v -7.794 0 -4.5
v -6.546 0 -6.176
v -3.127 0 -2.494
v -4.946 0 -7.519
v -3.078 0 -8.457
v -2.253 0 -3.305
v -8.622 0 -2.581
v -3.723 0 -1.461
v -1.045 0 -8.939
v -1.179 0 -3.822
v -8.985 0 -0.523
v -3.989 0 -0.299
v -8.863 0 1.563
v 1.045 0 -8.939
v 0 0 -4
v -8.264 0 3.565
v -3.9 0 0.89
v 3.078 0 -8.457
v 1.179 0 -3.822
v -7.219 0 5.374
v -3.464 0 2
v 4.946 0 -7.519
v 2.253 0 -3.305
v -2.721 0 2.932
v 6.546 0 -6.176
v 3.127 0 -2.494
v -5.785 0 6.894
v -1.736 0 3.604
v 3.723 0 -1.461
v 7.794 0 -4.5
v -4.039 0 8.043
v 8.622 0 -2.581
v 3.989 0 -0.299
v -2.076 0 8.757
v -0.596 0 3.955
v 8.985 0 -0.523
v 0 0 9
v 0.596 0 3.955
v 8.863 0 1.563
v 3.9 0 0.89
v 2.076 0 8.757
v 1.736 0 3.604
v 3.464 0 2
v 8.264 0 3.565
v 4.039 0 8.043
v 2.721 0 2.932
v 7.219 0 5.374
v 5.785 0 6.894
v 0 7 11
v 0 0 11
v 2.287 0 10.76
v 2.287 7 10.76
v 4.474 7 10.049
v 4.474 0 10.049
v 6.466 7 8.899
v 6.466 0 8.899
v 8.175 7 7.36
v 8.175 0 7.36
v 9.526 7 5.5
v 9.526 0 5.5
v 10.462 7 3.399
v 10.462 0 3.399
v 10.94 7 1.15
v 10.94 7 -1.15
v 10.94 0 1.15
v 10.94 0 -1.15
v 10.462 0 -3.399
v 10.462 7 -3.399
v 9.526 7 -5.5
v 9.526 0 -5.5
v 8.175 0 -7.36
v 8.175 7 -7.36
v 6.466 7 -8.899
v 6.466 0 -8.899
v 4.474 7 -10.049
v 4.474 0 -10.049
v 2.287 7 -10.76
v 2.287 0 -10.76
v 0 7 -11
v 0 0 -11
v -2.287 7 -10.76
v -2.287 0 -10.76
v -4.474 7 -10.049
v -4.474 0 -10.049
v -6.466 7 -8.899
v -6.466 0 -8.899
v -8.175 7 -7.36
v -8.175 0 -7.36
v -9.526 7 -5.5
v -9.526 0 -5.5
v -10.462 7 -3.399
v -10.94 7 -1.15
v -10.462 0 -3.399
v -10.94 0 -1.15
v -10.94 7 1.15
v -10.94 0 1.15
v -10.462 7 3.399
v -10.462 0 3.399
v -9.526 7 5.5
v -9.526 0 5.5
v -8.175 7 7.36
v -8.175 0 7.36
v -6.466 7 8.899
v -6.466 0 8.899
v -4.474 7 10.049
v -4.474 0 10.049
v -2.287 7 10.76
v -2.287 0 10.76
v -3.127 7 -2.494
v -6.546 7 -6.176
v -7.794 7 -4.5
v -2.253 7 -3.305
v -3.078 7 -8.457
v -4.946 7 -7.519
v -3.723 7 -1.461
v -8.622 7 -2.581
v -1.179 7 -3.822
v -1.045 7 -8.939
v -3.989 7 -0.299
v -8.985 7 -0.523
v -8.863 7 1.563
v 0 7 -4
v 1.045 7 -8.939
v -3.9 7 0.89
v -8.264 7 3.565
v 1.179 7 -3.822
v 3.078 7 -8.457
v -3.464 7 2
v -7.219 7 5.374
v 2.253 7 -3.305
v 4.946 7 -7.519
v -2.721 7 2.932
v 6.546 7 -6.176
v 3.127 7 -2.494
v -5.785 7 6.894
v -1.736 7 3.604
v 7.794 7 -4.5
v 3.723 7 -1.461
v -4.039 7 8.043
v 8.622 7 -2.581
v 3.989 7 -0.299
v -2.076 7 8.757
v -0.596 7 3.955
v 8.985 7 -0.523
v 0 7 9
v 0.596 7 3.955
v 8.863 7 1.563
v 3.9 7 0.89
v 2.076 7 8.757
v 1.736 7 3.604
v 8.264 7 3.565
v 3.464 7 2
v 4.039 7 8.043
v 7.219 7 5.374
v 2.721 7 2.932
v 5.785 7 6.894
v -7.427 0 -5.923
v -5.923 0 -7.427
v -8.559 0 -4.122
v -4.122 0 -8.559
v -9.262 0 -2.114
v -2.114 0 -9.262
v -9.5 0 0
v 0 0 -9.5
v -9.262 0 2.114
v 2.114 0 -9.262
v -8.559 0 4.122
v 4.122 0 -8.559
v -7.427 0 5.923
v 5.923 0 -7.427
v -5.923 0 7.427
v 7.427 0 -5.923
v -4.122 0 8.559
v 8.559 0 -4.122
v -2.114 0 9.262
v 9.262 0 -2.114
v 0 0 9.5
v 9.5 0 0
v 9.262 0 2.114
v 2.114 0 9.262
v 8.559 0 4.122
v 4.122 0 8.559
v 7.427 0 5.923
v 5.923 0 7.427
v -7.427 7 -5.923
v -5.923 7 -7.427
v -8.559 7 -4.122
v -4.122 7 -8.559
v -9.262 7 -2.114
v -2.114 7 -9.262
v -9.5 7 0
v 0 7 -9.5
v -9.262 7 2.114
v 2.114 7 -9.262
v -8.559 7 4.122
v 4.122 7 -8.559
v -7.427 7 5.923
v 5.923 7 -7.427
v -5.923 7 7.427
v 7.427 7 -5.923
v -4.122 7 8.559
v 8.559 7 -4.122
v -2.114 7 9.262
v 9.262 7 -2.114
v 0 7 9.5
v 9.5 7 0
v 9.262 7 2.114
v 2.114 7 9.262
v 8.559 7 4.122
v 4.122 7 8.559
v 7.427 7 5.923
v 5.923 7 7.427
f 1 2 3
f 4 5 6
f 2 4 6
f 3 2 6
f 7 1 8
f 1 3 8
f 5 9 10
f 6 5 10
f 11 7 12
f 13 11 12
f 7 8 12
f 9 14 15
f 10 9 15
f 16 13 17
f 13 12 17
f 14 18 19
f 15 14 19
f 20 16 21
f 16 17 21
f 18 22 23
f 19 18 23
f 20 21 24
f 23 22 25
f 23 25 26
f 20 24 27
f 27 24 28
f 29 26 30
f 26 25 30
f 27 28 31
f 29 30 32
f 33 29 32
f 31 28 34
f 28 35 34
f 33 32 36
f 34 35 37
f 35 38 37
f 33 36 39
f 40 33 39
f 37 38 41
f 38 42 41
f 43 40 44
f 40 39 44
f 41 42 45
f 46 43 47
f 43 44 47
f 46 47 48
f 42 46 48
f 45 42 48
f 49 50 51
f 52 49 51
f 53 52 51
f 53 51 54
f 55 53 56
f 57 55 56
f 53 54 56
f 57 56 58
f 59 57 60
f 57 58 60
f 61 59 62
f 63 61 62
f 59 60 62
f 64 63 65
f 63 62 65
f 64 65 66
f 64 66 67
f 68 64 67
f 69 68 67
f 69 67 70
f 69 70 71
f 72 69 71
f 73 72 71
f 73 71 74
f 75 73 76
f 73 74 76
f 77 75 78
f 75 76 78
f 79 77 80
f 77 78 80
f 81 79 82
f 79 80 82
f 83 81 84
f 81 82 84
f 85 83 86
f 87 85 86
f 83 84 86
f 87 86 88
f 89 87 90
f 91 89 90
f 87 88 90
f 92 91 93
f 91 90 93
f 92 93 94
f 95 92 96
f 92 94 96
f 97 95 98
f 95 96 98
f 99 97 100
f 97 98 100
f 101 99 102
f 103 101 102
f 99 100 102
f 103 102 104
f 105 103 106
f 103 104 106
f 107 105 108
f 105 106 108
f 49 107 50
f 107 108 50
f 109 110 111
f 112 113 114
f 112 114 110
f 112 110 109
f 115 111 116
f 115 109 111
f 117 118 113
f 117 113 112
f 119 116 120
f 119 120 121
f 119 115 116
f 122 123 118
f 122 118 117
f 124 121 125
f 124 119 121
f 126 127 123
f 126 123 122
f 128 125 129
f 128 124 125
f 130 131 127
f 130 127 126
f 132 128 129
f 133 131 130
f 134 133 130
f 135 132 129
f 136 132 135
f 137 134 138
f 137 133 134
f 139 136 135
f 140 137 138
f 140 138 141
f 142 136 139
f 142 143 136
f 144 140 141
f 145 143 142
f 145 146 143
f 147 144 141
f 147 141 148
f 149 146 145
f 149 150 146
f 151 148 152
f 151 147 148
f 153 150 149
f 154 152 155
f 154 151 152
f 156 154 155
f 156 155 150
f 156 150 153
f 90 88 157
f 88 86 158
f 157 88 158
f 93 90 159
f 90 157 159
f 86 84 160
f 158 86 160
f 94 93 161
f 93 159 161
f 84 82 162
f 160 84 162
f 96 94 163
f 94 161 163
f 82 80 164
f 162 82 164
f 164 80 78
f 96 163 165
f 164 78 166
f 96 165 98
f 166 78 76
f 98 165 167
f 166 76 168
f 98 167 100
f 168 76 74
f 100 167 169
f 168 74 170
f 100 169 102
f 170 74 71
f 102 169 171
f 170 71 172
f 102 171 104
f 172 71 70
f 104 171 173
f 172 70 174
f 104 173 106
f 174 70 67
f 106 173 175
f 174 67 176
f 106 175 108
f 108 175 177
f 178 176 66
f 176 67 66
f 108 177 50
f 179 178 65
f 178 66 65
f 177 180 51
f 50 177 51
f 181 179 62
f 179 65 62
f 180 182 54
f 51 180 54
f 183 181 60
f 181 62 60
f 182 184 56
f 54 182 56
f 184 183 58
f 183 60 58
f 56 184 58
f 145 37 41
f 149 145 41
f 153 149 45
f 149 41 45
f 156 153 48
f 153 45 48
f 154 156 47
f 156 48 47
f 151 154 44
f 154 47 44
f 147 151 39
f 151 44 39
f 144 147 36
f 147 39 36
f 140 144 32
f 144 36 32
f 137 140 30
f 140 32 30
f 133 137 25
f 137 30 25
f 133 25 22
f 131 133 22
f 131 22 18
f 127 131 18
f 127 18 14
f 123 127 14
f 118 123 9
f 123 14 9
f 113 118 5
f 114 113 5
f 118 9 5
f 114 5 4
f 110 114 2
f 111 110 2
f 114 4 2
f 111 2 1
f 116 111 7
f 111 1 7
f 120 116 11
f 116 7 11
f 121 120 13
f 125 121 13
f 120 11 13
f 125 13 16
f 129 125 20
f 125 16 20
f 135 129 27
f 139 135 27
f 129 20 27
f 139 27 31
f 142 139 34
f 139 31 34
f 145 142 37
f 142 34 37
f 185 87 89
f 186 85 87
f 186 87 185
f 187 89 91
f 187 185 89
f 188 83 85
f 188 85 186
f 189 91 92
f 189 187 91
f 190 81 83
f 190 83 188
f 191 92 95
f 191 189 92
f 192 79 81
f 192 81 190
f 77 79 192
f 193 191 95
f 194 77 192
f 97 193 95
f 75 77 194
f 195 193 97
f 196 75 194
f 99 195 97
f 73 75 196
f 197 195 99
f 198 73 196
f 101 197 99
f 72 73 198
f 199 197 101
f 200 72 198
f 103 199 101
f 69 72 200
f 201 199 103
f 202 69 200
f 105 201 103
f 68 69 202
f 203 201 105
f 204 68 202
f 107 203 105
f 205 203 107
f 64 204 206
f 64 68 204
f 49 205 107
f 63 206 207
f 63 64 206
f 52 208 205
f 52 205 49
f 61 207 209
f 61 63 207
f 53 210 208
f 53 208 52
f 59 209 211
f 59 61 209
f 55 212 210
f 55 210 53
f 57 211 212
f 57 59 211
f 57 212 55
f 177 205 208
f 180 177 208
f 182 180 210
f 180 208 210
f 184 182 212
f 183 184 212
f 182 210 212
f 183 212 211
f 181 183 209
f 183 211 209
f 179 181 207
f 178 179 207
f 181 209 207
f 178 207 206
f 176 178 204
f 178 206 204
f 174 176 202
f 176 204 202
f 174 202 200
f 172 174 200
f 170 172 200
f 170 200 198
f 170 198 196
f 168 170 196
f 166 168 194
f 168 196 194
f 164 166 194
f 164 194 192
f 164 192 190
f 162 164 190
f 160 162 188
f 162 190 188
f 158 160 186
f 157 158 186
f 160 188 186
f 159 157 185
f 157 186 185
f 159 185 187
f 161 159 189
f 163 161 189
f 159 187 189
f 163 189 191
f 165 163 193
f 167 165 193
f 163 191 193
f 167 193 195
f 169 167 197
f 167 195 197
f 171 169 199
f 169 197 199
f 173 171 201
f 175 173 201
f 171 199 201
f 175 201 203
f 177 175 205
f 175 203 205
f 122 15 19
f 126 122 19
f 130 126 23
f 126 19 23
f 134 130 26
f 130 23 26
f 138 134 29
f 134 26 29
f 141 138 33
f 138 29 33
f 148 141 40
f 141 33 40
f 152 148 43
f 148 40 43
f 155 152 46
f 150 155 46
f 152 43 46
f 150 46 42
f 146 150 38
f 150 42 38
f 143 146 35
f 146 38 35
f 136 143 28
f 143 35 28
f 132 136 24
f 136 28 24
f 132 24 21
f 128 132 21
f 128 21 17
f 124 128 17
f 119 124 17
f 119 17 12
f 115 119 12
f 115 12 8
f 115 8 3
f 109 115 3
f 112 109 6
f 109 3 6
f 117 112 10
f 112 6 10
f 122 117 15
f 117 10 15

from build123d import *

# Parameters (mm, degrees)
SKETCH1_R           = 11
BOSS_EXTRUDE1_DEPTH = 7
SKETCH2_R           = 9.5
CUT_EXTRUDE1_DEPTH  = 7
SKETCH3_R           = 9
BOSS_EXTRUDE2_DEPTH = 7
SKETCH5_R           = 4
CUT_EXTRUDE2_DEPTH  = 7


with BuildPart() as part:
    # Sketch1 → Boss-Extrude1 (new body)
    with BuildSketch(Plane(origin=(0, 0, 0), x_dir=(1, 0, 0), z_dir=(0, 1, 0))):
        with Locations(Location((0, 0, 0), (0, 0, 270))):
            Circle(SKETCH1_R)
    extrude(amount=BOSS_EXTRUDE1_DEPTH)

    # Sketch2 → Cut-Extrude1 (cut)
    with BuildSketch(Plane(origin=(0, 7, 0), x_dir=(1, 0, 0), z_dir=(0, 1, 0))):
        with Locations(Location((0, 0, 0), (0, 0, 270))):
            Circle(SKETCH2_R)
    extrude(amount=-CUT_EXTRUDE1_DEPTH, mode=Mode.SUBTRACT)


with BuildPart() as body_2:
    # Sketch3 → Boss-Extrude2 (new body)
    with BuildSketch(Plane(origin=(0, 0, 0), x_dir=(1, 0, 0), z_dir=(0, 1, 0))):
        with Locations(Location((0, 0, 0), (0, 0, 270))):
            Circle(SKETCH3_R)
    extrude(amount=BOSS_EXTRUDE2_DEPTH)

    # Sketch5 → Cut-Extrude2 (cut)
    with BuildSketch(Plane.XZ):
        with Locations(Location((0, 0, 0), (0, 0, 270))):
            Circle(SKETCH5_R)
    extrude(amount=-CUT_EXTRUDE2_DEPTH, mode=Mode.SUBTRACT)


solid = Compound([part.part, body_2.part])
